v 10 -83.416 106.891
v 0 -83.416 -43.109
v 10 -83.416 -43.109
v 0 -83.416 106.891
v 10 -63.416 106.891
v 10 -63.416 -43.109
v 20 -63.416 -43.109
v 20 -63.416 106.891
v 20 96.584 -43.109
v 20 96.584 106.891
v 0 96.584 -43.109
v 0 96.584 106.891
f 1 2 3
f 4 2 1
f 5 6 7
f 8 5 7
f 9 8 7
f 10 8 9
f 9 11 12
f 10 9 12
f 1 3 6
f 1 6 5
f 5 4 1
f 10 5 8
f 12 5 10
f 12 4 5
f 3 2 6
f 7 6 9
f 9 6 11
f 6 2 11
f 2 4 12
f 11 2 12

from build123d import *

# Parameters (mm, degrees)
F0_W     = 180
F0_H     = 150
F1_DEPTH = 20
F2_W     = 10
F2_H     = 150
F3_DEPTH = 20


# Not quite as in the source:
# - the program builds the solid bodies; features that only make, move or delete a surface that nothing else refers to are left out


with BuildPart() as f1:
    # F0 (on Right) → F1 (new body)
    with BuildSketch(Plane.YZ):
        with Locations((6.5838837624, 31.891247511)):
            Rectangle(F0_W, F0_H)
    extrude(amount=F1_DEPTH)

    # F2 (on face) → F3 (cut)
    with BuildSketch(Plane.XZ.offset(83.4161162376)):
        with Locations((15, 31.891247511)):
            Rectangle(F2_W, F2_H)
    extrude(amount=-F3_DEPTH, mode=Mode.SUBTRACT)


solid = f1.part
